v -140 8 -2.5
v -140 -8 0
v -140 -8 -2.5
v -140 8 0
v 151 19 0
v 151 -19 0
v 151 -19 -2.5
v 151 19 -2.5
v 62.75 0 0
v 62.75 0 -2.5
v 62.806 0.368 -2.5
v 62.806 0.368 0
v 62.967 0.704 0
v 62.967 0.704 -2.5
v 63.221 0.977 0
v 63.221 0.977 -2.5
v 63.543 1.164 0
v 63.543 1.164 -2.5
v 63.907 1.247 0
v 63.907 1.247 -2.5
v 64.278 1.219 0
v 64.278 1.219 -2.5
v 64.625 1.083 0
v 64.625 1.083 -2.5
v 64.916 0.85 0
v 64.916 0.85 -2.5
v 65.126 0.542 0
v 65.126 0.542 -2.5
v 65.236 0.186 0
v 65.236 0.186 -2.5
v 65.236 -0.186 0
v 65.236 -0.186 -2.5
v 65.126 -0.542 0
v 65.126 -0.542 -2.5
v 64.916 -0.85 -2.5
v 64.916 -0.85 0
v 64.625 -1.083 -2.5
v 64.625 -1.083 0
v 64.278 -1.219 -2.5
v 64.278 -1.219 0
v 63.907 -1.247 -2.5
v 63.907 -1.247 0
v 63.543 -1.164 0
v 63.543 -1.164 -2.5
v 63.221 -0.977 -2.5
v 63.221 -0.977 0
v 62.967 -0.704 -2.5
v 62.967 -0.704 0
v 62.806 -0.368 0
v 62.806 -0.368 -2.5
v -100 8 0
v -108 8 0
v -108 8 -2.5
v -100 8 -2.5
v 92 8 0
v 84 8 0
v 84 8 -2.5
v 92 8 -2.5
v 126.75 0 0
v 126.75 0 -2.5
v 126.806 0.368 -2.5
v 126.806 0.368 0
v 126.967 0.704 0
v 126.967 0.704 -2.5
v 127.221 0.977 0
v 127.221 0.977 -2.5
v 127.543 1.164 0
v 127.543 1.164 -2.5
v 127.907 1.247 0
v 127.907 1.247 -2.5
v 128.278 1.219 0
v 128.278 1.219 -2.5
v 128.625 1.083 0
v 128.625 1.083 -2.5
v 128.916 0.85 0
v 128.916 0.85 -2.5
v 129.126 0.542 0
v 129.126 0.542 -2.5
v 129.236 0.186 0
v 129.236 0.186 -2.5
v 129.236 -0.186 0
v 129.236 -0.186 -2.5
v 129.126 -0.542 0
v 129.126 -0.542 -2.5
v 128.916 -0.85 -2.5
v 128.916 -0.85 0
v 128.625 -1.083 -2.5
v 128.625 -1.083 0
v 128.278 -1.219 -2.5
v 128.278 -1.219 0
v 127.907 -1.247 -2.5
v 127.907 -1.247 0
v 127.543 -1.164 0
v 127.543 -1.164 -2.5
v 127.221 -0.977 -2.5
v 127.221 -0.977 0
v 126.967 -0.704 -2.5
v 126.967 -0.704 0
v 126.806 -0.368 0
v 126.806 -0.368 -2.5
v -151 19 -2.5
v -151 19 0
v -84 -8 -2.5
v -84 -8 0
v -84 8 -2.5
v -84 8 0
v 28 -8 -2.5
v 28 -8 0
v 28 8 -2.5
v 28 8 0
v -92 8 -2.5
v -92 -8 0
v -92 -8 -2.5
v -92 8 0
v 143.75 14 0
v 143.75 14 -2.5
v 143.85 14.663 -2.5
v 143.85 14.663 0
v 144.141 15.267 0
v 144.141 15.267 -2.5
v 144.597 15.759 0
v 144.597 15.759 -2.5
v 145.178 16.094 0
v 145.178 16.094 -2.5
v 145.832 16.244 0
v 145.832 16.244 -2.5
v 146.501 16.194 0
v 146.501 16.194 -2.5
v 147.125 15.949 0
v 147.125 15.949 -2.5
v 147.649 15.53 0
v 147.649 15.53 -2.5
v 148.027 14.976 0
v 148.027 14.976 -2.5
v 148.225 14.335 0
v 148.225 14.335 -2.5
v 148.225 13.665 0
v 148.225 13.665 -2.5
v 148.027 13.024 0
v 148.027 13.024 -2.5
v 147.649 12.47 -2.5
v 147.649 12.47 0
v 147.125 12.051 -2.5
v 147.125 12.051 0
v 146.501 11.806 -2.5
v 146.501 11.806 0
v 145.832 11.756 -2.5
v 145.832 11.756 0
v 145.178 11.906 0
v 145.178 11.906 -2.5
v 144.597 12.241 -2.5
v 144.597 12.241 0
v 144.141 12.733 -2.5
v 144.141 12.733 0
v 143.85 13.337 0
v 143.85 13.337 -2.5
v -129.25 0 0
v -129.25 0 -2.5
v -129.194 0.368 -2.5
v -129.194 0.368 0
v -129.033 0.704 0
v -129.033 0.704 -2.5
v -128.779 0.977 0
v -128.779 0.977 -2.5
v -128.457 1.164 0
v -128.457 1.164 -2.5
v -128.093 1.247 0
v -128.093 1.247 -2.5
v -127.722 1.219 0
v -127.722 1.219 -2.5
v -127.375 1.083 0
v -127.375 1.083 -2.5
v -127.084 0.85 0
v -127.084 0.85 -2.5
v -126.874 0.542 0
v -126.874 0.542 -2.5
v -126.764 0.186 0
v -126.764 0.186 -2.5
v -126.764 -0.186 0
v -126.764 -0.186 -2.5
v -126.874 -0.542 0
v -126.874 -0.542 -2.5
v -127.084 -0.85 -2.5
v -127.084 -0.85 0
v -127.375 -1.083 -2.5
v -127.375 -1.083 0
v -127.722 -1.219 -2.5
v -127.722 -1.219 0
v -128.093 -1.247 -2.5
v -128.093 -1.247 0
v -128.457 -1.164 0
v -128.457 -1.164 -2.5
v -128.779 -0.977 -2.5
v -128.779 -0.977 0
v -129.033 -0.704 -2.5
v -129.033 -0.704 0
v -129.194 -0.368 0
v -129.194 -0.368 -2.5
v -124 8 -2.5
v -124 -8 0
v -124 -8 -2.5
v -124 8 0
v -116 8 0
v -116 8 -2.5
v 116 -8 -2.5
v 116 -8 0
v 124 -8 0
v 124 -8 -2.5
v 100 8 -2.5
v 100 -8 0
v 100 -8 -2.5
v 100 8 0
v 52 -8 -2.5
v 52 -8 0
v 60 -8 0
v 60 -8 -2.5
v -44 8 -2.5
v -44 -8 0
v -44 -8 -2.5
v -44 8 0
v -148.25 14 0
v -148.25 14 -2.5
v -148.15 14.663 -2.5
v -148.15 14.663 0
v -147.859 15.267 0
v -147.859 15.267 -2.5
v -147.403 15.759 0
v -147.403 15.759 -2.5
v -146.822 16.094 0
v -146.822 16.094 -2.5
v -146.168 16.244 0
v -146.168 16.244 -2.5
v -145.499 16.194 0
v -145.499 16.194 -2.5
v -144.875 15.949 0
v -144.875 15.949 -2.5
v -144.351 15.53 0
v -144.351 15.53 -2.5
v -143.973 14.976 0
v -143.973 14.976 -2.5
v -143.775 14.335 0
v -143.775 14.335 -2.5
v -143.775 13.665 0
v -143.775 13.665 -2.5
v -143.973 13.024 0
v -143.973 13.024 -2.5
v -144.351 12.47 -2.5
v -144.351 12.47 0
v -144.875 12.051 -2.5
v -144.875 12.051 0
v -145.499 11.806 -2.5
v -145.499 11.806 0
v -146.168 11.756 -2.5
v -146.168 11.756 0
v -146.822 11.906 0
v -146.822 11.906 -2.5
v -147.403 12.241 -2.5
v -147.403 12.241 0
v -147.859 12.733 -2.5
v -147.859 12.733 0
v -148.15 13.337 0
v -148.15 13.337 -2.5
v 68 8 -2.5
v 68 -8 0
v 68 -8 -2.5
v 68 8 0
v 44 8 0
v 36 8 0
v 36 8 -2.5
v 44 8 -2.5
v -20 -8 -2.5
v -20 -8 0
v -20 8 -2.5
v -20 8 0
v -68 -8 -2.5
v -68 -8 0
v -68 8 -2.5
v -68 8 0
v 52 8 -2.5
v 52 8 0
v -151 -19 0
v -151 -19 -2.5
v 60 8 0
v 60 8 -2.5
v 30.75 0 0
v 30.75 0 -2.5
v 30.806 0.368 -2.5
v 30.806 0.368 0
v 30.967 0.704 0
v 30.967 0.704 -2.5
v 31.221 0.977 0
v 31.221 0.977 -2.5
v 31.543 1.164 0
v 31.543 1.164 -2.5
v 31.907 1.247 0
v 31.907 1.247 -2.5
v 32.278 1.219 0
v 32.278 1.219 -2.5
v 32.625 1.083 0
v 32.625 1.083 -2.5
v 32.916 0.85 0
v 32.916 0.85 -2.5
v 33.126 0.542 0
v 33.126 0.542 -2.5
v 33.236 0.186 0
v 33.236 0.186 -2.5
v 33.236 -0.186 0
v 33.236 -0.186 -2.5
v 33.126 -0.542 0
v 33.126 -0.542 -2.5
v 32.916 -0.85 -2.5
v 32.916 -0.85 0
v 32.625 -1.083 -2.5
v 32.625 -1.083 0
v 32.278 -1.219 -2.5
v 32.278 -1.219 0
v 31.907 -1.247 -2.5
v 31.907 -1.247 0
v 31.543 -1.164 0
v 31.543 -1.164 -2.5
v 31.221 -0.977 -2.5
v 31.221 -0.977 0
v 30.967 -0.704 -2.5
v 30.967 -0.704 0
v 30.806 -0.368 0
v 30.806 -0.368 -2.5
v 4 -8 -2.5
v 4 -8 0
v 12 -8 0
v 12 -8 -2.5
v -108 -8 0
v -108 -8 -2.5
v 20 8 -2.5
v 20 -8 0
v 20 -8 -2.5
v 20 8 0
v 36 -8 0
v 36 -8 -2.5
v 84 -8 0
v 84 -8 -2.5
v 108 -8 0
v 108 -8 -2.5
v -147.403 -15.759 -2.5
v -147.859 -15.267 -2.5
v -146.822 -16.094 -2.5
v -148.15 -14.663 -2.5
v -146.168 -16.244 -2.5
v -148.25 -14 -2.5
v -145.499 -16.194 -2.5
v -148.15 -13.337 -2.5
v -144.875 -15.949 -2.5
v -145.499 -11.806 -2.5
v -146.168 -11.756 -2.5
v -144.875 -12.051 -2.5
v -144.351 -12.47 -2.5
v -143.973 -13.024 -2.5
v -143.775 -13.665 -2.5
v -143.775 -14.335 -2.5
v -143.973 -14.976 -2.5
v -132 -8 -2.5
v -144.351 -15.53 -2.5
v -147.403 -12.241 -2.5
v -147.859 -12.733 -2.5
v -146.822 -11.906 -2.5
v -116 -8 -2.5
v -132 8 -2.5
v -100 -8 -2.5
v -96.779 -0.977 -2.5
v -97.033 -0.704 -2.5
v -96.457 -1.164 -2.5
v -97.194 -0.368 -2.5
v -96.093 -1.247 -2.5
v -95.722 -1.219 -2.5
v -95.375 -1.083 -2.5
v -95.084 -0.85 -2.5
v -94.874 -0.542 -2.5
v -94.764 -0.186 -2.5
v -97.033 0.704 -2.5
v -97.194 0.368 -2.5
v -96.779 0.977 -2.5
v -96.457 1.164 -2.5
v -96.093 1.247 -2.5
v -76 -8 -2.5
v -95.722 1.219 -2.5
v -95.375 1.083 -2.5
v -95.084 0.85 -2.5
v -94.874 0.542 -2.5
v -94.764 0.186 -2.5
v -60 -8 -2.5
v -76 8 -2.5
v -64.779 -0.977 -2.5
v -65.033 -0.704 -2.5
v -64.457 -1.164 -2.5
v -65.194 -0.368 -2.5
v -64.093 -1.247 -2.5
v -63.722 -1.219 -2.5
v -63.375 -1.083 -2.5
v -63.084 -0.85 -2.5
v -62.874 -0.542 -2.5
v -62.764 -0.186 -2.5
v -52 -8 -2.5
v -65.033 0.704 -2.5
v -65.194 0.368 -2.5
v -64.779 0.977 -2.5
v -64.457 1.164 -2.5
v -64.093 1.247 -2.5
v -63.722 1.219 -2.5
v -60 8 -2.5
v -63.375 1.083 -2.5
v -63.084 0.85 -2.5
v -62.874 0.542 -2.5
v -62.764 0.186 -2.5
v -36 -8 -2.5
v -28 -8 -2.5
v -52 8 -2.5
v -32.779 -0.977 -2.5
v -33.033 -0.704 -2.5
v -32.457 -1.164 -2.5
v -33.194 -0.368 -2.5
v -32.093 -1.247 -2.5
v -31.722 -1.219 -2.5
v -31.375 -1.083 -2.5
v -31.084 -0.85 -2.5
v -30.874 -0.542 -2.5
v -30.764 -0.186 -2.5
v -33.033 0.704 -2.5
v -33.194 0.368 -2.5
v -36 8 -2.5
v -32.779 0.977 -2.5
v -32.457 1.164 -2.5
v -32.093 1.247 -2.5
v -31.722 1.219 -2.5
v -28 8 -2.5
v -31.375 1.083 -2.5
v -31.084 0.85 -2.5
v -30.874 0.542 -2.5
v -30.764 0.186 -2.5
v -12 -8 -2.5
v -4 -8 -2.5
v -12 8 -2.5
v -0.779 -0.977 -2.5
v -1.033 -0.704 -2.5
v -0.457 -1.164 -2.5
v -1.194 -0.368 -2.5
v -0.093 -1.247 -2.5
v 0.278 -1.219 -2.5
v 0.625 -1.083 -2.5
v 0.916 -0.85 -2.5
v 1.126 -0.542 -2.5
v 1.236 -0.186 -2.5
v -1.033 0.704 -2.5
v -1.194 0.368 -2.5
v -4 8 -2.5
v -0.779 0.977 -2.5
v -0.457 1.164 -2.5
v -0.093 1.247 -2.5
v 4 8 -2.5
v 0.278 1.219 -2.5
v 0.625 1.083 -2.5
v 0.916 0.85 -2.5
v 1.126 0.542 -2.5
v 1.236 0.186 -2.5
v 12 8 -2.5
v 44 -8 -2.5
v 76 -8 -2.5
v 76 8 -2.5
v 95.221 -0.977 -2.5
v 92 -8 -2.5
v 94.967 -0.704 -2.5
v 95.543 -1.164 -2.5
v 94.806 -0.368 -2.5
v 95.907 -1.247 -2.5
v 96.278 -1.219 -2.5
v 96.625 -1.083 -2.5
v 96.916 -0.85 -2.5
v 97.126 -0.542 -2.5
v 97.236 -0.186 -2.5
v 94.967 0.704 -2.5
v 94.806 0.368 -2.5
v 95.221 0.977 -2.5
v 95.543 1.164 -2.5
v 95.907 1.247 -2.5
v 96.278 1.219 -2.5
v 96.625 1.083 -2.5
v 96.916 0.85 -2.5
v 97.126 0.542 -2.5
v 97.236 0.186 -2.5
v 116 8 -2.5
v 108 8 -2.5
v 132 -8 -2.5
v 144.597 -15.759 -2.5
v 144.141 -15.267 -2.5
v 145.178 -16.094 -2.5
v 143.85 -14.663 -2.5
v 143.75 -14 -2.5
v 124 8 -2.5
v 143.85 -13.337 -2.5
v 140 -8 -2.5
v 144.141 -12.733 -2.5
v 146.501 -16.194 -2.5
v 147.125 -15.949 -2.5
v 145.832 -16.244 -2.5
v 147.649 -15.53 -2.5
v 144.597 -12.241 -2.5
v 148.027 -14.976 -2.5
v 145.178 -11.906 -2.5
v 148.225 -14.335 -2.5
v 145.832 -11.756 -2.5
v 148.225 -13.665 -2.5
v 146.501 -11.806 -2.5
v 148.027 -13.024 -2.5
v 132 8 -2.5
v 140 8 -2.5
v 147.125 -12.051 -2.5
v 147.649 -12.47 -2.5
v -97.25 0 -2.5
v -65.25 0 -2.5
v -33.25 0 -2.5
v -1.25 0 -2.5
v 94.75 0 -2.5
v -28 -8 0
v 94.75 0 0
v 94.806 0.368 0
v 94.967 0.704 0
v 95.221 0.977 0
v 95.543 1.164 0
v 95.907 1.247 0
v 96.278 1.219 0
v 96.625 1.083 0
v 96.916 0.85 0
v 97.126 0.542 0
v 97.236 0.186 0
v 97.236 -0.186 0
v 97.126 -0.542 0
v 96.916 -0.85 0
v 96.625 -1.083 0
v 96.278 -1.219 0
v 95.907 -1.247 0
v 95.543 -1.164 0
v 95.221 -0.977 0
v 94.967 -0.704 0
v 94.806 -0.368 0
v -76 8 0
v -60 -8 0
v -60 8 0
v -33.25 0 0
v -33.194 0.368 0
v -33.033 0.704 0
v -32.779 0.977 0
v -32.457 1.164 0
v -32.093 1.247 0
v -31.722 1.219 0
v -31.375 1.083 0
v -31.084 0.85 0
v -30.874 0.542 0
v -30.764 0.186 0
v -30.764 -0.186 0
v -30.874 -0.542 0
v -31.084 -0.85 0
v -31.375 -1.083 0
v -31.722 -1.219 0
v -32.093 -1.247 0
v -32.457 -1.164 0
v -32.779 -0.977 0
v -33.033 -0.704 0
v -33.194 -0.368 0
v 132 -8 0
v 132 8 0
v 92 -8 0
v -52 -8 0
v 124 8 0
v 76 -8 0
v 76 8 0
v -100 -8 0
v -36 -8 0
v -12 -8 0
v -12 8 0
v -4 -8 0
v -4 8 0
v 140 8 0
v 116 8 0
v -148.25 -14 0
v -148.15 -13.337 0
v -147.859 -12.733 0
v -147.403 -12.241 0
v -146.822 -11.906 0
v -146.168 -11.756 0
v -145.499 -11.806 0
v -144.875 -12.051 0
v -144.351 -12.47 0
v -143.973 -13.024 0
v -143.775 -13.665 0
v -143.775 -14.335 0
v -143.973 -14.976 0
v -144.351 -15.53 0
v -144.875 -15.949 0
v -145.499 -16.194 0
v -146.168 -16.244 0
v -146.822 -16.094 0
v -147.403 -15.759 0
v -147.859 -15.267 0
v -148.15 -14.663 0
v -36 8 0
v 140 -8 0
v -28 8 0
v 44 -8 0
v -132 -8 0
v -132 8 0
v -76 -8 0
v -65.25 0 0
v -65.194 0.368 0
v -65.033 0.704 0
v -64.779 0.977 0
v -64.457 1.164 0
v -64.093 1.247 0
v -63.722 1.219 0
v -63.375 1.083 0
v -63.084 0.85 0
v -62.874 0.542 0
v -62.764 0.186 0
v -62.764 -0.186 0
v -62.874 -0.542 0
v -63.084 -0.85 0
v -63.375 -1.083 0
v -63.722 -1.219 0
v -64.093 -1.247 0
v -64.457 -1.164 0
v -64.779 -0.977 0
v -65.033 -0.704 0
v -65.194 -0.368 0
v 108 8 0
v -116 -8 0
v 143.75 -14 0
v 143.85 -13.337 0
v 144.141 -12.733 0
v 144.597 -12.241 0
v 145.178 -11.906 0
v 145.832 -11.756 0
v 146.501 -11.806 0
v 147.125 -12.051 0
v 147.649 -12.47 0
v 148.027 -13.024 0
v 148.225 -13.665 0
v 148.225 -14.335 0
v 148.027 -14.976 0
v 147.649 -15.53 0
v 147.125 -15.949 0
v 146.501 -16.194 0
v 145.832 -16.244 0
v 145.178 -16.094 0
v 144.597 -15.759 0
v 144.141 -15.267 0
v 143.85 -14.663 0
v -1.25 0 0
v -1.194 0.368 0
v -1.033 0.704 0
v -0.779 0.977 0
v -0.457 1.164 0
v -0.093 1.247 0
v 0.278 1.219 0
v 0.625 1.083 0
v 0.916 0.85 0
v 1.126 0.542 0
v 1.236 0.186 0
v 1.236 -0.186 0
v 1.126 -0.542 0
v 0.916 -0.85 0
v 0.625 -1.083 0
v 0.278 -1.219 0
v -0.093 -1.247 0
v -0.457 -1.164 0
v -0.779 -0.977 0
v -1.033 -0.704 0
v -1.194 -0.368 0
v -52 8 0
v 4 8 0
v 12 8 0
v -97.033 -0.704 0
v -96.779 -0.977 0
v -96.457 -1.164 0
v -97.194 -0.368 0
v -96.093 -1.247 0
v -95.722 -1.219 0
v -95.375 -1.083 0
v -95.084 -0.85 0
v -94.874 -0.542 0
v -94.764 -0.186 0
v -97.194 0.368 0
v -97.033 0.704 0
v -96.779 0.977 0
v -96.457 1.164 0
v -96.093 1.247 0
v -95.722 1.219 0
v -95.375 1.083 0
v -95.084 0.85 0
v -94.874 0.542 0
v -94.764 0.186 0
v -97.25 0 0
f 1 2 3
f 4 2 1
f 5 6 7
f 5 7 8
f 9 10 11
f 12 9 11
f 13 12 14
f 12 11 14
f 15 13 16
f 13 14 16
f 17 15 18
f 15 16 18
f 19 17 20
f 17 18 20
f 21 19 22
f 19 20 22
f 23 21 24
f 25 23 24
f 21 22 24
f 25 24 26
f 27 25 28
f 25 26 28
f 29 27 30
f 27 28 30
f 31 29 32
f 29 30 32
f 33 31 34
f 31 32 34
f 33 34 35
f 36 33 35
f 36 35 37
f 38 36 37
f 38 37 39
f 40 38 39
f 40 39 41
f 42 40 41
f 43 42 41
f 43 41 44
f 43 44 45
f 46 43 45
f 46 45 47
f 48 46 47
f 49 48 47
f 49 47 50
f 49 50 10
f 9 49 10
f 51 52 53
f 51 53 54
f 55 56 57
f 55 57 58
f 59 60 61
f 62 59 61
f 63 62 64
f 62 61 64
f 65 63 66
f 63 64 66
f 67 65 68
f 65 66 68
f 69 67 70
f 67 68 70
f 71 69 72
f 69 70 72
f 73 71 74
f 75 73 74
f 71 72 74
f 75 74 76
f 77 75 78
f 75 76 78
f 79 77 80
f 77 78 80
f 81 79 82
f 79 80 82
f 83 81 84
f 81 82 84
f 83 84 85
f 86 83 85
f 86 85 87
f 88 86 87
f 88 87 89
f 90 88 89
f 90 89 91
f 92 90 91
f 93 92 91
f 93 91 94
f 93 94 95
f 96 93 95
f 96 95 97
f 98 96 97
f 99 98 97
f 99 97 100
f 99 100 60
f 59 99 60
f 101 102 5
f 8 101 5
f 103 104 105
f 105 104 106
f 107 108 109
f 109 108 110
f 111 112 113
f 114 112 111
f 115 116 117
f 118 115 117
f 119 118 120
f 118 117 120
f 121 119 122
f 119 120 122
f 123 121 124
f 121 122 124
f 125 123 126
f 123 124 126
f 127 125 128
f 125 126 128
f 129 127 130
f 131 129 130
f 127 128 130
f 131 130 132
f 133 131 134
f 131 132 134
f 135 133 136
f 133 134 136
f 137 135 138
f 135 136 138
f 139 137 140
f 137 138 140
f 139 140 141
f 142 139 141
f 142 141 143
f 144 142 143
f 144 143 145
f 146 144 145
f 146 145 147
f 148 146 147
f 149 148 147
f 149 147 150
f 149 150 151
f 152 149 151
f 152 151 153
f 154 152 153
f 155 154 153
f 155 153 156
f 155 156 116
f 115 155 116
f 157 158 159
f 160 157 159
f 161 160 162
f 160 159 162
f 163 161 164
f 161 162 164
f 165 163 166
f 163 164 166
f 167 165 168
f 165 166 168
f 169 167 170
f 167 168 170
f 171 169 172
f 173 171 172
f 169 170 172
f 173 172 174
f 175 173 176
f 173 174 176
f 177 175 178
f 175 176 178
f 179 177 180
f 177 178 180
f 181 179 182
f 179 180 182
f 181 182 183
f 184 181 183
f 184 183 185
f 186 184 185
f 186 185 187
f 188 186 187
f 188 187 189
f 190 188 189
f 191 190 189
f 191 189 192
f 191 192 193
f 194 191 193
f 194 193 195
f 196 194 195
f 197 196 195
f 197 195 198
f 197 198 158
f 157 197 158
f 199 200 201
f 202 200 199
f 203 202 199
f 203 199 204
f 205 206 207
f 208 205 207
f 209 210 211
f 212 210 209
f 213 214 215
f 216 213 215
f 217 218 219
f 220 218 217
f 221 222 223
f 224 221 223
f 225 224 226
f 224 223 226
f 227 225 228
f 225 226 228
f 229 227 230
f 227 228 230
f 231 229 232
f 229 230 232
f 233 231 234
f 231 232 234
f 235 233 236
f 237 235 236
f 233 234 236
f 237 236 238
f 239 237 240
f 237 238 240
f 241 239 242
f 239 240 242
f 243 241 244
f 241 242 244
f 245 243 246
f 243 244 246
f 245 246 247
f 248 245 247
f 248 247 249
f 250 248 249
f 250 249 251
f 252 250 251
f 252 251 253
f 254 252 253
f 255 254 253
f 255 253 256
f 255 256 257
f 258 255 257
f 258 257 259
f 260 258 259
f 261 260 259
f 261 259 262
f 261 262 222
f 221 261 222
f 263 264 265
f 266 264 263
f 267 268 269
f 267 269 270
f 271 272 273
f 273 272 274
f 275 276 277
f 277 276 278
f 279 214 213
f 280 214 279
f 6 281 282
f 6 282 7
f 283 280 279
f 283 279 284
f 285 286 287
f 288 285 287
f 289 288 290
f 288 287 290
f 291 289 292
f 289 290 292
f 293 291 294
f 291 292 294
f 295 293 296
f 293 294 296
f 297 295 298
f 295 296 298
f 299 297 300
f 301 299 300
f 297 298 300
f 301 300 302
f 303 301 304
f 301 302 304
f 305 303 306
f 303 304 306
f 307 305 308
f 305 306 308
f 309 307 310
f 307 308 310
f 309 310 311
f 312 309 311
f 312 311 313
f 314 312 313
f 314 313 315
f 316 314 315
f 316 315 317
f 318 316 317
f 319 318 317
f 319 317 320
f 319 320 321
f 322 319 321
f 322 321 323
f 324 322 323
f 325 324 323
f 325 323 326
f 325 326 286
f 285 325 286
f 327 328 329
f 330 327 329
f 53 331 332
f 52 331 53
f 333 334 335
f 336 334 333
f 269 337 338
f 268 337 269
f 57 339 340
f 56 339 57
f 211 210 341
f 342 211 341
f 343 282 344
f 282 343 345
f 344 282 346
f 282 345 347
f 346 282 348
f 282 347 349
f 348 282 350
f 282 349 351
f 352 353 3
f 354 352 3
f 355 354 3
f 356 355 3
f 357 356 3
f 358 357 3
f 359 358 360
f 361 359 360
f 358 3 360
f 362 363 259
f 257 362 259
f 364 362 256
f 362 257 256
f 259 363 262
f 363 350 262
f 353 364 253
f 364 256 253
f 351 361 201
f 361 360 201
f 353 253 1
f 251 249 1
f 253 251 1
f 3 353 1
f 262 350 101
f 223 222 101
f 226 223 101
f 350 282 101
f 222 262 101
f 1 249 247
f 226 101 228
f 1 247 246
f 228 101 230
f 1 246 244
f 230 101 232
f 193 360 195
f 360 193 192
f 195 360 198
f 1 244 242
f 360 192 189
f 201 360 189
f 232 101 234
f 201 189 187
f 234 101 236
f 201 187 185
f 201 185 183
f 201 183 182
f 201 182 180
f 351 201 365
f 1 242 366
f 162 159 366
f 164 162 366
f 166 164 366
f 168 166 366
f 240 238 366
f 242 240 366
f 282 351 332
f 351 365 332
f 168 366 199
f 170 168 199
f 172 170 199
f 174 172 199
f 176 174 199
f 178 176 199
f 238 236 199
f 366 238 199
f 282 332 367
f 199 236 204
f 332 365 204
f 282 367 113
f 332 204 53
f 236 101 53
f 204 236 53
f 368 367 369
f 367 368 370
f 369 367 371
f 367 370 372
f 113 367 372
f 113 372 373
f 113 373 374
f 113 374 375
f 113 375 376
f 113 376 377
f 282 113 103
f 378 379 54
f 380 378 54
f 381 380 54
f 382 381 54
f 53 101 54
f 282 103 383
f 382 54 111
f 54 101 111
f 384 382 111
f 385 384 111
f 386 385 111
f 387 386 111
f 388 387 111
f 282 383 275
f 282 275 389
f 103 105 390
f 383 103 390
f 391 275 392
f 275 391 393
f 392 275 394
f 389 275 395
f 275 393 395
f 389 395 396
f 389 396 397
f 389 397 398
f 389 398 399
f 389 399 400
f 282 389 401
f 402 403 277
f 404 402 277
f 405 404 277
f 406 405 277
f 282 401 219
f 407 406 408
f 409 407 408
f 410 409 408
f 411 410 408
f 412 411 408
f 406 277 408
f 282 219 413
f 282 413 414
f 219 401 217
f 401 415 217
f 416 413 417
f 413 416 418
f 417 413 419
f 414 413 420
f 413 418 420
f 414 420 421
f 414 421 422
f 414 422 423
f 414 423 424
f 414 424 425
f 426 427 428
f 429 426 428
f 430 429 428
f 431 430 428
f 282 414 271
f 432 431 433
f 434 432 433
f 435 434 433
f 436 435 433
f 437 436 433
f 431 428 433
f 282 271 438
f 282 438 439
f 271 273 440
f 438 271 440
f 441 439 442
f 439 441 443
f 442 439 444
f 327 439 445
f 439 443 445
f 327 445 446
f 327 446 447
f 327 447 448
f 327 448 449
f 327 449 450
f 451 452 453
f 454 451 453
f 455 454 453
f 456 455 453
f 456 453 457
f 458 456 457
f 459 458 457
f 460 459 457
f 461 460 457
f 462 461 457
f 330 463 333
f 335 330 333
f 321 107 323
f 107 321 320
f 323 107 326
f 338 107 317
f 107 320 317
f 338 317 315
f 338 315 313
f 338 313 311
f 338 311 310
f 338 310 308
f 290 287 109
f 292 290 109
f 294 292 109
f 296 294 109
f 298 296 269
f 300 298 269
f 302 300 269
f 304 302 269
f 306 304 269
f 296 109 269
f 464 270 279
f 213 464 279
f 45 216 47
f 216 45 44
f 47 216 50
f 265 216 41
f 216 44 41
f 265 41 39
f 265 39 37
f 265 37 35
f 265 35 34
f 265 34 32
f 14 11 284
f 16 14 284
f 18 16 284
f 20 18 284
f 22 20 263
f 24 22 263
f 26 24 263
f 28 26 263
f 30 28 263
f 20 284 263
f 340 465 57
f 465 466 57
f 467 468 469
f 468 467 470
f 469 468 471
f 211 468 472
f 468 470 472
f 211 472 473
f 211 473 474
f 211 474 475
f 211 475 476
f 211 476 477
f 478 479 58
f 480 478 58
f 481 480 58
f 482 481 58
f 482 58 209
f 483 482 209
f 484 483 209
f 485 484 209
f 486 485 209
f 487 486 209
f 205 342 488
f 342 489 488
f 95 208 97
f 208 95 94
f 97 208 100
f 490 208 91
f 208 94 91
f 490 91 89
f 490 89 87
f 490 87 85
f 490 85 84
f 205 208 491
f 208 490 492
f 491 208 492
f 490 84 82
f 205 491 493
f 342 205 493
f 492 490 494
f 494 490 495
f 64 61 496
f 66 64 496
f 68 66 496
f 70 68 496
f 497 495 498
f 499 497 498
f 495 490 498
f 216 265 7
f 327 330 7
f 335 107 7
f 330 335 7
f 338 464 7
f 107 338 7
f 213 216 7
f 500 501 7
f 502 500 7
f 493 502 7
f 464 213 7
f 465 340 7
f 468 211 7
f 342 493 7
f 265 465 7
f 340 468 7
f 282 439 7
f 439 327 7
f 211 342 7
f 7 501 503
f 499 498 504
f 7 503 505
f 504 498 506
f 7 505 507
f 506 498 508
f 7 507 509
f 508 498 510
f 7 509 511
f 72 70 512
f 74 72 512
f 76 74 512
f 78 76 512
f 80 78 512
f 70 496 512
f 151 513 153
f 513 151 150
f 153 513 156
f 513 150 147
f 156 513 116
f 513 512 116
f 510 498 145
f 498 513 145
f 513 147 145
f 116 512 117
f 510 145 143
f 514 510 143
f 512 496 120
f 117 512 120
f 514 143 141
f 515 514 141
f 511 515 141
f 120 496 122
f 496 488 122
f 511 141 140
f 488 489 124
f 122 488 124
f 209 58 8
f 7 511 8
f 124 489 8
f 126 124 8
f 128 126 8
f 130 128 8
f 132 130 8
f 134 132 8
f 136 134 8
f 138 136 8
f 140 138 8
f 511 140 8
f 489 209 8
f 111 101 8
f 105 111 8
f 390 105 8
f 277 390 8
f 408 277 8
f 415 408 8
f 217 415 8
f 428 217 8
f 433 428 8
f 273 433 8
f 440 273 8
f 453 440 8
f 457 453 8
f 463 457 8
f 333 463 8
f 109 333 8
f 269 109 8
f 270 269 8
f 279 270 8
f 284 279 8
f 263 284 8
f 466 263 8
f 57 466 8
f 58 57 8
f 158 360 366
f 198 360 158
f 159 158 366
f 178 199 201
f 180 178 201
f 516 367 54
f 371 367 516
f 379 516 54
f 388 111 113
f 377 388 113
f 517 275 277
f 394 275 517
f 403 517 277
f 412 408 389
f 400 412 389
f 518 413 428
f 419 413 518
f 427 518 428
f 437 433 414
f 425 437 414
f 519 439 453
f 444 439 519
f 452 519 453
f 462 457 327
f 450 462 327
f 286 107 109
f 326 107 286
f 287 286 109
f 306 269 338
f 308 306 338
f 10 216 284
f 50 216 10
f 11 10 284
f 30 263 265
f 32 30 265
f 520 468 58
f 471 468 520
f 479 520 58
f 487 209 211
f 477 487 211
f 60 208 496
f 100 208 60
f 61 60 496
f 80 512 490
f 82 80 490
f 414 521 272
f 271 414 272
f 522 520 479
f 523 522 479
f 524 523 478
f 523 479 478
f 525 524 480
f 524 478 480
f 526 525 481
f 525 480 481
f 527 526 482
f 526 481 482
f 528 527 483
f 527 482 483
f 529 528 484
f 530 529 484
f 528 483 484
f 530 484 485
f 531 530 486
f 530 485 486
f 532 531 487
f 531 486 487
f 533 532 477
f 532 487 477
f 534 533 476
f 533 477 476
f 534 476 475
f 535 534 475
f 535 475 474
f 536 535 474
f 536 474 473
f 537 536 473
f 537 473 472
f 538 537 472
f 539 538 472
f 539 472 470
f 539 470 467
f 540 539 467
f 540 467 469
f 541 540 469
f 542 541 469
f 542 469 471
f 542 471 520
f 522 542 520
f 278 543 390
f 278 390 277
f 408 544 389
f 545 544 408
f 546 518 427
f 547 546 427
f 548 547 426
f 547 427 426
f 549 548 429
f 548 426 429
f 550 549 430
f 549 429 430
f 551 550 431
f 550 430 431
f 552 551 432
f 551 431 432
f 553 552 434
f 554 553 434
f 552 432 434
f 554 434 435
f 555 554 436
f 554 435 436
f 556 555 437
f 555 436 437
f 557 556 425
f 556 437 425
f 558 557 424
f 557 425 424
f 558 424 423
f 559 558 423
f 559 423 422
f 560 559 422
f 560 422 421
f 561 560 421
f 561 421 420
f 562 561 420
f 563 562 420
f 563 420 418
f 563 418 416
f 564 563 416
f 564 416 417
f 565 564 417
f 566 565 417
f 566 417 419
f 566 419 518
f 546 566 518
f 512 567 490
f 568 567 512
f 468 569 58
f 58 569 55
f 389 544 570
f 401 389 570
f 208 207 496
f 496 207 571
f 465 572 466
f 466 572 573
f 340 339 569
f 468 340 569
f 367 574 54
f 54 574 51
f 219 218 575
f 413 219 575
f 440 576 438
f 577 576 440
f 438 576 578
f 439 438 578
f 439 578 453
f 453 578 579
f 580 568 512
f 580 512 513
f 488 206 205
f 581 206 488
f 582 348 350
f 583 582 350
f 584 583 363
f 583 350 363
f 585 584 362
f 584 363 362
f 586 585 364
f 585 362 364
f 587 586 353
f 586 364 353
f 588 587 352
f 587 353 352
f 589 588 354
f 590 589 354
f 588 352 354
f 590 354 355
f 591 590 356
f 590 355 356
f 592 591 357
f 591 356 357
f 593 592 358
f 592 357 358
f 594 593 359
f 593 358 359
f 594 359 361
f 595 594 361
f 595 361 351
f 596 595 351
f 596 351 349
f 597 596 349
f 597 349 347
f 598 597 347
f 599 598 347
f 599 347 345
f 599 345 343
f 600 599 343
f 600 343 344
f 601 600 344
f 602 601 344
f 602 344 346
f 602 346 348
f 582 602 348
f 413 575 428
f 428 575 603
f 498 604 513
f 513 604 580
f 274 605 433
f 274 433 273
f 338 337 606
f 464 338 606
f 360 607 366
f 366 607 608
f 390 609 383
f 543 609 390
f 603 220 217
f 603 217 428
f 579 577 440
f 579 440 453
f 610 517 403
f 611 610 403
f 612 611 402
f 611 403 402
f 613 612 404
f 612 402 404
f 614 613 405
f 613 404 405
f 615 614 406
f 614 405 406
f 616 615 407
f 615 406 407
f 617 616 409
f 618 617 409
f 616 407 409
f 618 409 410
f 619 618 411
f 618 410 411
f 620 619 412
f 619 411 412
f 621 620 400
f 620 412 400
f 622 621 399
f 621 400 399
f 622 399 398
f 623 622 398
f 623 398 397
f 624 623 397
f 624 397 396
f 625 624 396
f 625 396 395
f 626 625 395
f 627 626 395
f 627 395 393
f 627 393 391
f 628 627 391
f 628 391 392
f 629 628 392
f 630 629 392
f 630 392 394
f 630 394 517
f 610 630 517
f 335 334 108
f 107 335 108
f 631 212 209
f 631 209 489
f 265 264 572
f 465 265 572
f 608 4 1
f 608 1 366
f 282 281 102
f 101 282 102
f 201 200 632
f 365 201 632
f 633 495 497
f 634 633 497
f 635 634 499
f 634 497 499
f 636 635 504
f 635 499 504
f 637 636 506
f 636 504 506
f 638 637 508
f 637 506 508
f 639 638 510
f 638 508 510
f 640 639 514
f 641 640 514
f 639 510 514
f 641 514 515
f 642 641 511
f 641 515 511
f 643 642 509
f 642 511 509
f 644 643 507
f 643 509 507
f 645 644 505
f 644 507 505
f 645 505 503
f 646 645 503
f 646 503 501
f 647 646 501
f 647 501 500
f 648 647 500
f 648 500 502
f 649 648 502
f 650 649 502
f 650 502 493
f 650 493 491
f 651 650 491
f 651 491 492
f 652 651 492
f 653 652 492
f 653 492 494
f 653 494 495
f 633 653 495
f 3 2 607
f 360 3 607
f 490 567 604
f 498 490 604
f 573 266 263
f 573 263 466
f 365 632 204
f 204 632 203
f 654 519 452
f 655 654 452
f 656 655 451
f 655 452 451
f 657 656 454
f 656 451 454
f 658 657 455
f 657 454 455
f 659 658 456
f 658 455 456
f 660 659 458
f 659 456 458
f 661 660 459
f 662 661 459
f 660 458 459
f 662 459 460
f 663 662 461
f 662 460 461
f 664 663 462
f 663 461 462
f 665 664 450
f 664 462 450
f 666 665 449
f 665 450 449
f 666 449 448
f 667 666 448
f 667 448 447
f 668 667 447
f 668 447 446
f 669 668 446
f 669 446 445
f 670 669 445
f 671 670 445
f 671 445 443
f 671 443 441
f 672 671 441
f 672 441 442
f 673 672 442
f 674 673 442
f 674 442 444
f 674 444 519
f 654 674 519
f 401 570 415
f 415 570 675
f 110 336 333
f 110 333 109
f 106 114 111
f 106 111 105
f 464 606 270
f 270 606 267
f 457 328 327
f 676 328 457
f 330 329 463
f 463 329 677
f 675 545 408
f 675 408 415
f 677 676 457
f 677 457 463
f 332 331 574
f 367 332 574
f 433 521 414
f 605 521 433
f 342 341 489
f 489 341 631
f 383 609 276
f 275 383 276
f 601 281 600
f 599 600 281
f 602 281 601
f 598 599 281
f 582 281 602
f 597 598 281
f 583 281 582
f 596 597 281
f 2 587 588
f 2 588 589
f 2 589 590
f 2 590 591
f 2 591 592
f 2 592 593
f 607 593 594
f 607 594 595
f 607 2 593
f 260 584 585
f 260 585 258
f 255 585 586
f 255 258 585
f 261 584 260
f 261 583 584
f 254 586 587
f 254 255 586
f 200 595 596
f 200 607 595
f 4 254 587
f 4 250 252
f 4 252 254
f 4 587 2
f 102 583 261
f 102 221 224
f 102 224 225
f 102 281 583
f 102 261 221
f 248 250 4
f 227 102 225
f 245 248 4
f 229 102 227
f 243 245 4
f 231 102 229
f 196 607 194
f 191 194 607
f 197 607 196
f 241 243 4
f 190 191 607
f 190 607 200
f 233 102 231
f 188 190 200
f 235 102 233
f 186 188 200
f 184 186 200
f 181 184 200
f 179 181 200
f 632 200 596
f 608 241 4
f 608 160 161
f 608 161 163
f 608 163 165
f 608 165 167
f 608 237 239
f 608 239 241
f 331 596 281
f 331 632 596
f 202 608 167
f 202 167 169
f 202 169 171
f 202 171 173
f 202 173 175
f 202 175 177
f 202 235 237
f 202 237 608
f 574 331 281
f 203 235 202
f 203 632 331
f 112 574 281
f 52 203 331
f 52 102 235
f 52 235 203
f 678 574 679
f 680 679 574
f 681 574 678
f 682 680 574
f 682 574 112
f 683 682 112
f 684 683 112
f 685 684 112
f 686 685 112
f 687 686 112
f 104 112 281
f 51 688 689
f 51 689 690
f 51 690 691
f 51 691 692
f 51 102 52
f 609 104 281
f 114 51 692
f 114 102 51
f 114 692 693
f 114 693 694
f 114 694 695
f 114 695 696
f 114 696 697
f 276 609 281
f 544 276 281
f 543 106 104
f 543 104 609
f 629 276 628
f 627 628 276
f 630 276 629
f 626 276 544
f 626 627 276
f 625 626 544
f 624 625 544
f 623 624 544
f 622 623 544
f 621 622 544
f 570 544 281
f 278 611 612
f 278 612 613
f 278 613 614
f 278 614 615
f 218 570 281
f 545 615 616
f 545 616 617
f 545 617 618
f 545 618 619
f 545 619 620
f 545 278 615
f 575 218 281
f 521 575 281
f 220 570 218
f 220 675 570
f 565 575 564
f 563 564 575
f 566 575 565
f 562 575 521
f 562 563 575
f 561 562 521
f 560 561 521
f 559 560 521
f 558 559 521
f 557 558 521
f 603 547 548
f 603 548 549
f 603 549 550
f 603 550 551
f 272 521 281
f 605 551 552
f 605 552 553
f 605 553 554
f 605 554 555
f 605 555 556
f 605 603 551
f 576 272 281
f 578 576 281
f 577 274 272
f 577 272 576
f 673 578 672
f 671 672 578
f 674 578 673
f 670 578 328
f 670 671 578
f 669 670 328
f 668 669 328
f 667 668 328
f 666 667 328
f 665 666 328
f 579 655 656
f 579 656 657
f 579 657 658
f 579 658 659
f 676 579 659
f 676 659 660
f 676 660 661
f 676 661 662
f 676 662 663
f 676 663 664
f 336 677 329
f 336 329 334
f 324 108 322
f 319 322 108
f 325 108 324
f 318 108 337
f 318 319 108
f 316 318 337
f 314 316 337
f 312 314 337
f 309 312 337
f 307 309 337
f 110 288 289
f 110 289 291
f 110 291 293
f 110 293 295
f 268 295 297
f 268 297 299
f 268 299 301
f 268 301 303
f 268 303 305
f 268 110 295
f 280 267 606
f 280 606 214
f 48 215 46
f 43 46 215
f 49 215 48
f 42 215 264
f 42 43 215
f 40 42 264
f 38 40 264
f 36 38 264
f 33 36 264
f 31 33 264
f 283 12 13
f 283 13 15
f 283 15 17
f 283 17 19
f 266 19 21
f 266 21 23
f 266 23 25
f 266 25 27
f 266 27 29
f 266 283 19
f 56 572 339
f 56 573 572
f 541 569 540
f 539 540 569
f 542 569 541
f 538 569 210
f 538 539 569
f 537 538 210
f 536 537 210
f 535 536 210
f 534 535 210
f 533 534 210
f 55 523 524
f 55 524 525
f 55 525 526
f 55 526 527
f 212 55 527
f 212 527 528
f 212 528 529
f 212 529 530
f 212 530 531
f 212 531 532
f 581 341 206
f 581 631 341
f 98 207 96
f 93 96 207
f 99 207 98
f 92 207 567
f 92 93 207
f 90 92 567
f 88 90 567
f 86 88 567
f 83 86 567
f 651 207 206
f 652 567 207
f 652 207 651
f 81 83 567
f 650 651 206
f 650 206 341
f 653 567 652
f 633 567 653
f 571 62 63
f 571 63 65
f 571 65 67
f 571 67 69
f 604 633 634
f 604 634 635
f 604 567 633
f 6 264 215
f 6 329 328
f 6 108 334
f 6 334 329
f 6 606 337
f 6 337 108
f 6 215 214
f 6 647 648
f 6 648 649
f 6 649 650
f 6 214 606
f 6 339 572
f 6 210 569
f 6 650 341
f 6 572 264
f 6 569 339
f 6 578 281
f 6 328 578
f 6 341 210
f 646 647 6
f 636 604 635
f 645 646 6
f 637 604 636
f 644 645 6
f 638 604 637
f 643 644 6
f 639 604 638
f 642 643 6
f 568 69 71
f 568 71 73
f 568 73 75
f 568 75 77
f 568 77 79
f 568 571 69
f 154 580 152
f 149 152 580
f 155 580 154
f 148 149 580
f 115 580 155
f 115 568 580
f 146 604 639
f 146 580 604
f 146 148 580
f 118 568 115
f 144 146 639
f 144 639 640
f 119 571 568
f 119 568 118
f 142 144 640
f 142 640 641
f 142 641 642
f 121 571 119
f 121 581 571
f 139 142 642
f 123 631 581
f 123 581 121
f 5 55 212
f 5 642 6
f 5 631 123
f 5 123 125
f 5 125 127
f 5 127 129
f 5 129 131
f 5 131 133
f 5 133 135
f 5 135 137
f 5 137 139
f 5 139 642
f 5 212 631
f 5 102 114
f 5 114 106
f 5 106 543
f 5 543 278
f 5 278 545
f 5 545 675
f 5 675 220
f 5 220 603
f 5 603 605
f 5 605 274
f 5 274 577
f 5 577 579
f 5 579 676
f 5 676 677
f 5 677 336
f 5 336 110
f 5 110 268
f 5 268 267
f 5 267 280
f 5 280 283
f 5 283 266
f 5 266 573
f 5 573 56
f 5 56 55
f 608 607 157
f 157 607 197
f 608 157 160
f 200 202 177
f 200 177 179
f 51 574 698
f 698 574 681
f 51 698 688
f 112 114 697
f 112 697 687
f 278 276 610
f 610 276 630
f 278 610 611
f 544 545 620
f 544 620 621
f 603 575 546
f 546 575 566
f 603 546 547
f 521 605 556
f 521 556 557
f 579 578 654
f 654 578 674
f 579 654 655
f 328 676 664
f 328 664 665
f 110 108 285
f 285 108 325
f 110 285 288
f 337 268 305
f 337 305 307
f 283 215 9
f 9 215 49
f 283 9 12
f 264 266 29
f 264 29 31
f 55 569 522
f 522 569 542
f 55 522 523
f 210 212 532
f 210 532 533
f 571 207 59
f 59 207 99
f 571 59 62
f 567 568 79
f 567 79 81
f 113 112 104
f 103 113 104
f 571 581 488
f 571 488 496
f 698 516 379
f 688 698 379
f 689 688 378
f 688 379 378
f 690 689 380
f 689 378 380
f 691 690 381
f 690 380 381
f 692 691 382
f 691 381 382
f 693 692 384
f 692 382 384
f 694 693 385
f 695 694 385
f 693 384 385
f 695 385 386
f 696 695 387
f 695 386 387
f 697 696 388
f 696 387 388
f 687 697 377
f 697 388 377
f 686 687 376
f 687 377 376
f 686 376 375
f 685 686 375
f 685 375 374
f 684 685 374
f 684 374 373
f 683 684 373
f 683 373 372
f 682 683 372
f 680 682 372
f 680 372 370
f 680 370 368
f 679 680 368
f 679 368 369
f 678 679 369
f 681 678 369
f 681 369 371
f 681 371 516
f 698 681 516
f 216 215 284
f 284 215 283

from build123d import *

# Parameters (mm, degrees)
F0_W     = 302
F0_H     = 38
F0_W_2   = 8
F0_H_2   = 16
F1_DEPTH = 2.5
F2_D     = 2.5
F3_D     = 4.5
F4_DEPTH = 2.501


with BuildPart() as f1:
    # F0 (on Top) → F1 (new body)
    with BuildSketch(Plane.XY):
        Rectangle(F0_W, F0_H)
        with Locations((-136, 0)):
            Rectangle(F0_W_2, F0_H_2, mode=Mode.SUBTRACT)
        with Locations((-120, 0)):
            Rectangle(F0_W_2, F0_H_2, mode=Mode.SUBTRACT)
        with Locations((-104, 0)):
            Rectangle(F0_W_2, F0_H_2, mode=Mode.SUBTRACT)
        with Locations((-88, 0)):
            Rectangle(F0_W_2, F0_H_2, mode=Mode.SUBTRACT)
        with Locations((-72, 0)):
            Rectangle(F0_W_2, F0_H_2, mode=Mode.SUBTRACT)
        with Locations((-56, 0)):
            Rectangle(F0_W_2, F0_H_2, mode=Mode.SUBTRACT)
        with Locations((-40, 0)):
            Rectangle(F0_W_2, F0_H_2, mode=Mode.SUBTRACT)
        with Locations((-24, 0)):
            Rectangle(F0_W_2, F0_H_2, mode=Mode.SUBTRACT)
        with Locations((-8, 0)):
            Rectangle(F0_W_2, F0_H_2, mode=Mode.SUBTRACT)
        with Locations((8, 0)):
            Rectangle(F0_W_2, F0_H_2, mode=Mode.SUBTRACT)
        with Locations((24, 0)):
            Rectangle(F0_W_2, F0_H_2, mode=Mode.SUBTRACT)
        with Locations((40, 0)):
            Rectangle(F0_W_2, F0_H_2, mode=Mode.SUBTRACT)
        with Locations((56, 0)):
            Rectangle(F0_W_2, F0_H_2, mode=Mode.SUBTRACT)
        with Locations((72, 0)):
            Rectangle(F0_W_2, F0_H_2, mode=Mode.SUBTRACT)
        with Locations((88, 0)):
            Rectangle(F0_W_2, F0_H_2, mode=Mode.SUBTRACT)
        with Locations((104, 0)):
            Rectangle(F0_W_2, F0_H_2, mode=Mode.SUBTRACT)
        with Locations((120, 0)):
            Rectangle(F0_W_2, F0_H_2, mode=Mode.SUBTRACT)
        with Locations((136, 0)):
            Rectangle(F0_W_2, F0_H_2, mode=Mode.SUBTRACT)
    extrude(amount=-F1_DEPTH)

    # F2 (through all)
    with Locations(Plane.XY):
        with Locations((-128, 0), (-96, 0), (-64, 0), (-32, 0), (0, 0), (32, 0), (64, 0), (96, 0), (128, 0)):
            Hole(F2_D / 2)

    # F3 (through all)
    with Locations(Plane.XY):
        with Locations((-146, 14), (-146, -14), (146, 14), (146, -14)):
            Hole(F3_D / 2)

    # F0 (on Top) → F4 (cut, through all)
    with BuildSketch(Plane.XY):
        with Locations((-136, 0)):
            Rectangle(F0_W_2, F0_H_2)
    extrude(amount=-F4_DEPTH, mode=Mode.SUBTRACT)


solid = f1.part
